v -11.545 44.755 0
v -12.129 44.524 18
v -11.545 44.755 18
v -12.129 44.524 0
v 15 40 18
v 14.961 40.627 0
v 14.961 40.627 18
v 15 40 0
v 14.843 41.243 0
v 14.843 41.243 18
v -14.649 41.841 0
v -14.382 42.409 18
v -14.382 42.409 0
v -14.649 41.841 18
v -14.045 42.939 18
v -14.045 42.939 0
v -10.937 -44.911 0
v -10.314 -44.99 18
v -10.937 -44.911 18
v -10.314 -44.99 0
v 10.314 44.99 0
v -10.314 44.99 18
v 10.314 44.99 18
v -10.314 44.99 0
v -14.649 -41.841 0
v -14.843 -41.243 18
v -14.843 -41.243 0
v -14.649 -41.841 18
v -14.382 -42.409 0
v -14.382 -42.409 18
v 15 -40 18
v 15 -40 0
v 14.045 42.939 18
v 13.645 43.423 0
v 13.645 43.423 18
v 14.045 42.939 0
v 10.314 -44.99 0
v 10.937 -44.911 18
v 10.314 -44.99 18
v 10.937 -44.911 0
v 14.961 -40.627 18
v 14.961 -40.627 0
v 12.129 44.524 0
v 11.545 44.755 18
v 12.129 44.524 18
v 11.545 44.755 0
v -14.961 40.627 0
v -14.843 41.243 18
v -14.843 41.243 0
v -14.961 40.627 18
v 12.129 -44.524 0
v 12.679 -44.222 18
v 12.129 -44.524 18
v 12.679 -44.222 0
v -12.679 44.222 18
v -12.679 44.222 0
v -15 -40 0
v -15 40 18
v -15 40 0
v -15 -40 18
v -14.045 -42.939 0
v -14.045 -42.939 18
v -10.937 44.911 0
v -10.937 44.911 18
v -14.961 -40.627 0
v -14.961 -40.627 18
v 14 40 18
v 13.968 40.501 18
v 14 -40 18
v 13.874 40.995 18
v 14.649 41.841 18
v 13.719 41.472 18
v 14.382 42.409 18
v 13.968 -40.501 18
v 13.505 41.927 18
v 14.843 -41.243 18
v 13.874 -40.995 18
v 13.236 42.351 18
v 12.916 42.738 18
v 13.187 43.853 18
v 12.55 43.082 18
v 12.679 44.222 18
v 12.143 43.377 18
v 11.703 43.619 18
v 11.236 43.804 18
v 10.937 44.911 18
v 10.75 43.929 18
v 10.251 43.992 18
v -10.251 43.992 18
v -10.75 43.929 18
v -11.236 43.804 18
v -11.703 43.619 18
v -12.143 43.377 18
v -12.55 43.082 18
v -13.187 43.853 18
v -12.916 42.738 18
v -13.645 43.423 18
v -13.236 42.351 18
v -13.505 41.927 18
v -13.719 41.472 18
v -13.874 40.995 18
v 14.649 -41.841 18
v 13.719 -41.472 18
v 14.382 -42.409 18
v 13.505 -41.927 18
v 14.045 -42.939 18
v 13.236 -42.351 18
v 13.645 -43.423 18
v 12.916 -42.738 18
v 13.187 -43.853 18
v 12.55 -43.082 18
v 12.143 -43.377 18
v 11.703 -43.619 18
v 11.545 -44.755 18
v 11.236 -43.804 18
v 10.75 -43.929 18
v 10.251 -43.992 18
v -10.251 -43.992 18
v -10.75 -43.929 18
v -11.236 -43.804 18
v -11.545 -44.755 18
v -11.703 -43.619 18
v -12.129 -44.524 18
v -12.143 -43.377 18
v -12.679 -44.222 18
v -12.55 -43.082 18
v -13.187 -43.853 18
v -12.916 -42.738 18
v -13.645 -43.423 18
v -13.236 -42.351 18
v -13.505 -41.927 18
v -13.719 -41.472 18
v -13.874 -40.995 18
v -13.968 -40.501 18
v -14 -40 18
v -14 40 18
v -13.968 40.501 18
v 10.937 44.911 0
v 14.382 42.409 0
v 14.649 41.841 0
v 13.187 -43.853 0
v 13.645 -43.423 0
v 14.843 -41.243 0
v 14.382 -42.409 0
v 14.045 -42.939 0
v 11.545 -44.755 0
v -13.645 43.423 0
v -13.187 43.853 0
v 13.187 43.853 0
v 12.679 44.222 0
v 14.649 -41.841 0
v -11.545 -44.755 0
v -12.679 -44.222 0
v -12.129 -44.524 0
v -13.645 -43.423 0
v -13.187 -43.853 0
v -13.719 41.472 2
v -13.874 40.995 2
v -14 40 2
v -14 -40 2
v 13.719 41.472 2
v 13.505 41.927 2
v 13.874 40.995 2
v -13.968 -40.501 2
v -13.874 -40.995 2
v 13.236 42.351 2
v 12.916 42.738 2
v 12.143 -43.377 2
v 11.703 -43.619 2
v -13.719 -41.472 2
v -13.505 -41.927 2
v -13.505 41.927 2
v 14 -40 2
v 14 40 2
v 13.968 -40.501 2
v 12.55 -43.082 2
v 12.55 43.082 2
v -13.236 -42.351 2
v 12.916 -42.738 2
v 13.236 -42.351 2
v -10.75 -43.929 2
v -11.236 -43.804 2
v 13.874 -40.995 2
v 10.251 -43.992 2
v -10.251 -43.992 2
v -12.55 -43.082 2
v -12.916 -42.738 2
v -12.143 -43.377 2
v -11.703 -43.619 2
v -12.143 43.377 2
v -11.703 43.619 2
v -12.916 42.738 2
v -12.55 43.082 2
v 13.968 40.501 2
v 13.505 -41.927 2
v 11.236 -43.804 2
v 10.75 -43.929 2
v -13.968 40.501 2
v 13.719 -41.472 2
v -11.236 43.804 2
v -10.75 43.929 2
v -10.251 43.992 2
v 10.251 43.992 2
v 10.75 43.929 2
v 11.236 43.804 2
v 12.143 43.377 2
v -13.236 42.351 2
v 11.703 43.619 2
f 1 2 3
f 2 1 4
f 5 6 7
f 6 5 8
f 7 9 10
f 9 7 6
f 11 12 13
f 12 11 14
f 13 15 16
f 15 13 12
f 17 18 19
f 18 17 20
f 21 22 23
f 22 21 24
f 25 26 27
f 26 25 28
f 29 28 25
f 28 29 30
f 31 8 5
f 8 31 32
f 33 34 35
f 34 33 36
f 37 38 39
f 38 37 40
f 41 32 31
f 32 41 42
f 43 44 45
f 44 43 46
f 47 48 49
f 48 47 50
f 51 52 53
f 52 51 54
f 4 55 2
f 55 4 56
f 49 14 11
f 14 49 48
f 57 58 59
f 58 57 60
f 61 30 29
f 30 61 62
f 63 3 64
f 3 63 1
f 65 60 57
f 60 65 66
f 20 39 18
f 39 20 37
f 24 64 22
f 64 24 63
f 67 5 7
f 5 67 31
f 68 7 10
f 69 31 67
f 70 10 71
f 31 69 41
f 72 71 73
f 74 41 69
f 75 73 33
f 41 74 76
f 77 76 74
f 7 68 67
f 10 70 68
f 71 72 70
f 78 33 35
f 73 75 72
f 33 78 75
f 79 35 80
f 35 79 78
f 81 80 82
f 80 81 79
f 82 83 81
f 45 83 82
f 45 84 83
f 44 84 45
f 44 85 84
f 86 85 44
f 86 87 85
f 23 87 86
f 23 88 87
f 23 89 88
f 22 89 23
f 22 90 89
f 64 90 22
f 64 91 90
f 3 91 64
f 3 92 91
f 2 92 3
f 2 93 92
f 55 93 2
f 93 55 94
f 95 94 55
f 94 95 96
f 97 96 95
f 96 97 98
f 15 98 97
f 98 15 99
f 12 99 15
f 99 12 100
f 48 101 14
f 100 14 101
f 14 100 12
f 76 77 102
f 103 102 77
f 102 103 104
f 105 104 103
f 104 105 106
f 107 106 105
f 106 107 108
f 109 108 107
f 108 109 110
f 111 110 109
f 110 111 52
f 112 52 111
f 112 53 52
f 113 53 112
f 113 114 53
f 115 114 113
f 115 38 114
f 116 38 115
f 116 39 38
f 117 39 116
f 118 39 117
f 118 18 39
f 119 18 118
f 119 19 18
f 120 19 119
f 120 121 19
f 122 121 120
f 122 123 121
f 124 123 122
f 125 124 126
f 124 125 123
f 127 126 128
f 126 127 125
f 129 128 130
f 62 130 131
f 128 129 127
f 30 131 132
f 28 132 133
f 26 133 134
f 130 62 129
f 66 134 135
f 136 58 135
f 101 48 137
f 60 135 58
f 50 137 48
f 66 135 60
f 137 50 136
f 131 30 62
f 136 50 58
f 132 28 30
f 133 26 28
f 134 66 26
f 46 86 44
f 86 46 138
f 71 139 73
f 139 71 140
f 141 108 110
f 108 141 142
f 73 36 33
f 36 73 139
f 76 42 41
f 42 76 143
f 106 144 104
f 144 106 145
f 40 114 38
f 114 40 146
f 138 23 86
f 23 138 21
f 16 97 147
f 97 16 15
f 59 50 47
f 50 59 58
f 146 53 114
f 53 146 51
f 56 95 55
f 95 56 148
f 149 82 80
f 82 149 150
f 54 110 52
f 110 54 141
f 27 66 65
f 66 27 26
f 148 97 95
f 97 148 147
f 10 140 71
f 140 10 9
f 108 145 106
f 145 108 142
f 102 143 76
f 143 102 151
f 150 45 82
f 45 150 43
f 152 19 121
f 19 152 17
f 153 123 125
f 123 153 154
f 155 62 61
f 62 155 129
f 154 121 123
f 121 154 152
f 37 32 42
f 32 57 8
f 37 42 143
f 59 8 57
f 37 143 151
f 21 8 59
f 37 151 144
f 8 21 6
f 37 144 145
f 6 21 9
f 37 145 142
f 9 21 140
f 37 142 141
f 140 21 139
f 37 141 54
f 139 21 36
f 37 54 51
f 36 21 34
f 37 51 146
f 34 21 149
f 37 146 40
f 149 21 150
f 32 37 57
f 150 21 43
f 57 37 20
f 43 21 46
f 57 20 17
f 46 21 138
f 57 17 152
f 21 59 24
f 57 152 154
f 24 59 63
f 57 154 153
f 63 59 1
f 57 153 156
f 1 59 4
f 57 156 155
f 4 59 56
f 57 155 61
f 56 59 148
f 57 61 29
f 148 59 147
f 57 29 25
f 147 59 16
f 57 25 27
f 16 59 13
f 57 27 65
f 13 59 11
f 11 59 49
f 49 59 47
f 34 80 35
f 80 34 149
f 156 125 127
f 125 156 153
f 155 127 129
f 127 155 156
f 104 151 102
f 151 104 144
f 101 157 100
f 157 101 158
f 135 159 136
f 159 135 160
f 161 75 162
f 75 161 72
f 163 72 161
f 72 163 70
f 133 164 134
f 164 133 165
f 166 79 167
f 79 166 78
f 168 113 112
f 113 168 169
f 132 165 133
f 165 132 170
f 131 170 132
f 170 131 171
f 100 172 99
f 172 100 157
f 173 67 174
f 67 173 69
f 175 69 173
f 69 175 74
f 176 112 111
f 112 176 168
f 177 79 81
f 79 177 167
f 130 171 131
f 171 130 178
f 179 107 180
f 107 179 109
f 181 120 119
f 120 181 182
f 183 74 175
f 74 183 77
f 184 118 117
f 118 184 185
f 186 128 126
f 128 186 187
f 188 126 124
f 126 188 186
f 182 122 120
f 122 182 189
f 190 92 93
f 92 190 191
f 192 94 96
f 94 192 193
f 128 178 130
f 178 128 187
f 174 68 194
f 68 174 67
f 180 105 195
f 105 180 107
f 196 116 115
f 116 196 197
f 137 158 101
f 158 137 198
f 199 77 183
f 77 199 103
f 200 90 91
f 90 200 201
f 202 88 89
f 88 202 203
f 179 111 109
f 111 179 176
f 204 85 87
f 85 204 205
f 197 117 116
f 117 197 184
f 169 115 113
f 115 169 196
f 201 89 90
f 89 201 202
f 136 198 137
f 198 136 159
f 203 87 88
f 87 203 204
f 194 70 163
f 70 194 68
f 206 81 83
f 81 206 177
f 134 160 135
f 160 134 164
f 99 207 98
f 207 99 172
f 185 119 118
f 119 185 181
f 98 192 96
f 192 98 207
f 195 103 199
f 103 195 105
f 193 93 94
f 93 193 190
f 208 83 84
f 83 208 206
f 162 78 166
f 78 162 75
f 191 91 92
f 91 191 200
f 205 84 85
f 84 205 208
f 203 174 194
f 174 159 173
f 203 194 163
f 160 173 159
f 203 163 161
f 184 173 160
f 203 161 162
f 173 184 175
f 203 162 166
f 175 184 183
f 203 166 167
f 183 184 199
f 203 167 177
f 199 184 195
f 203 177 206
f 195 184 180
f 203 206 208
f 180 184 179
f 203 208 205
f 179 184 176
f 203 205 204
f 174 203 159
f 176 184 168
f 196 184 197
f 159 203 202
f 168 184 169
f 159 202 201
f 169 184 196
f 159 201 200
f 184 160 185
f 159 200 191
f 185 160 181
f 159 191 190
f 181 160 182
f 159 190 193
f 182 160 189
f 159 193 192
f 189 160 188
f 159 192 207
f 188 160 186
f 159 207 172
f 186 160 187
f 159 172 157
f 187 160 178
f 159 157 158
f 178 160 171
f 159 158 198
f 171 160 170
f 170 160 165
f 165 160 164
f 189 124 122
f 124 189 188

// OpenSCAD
$fn = 50;


difference() {
	union() {
		hull() {
			translate(v = [-10.0000000000, 40.0000000000, 0]) {
				cylinder(h = 18, r = 5);
			}
			translate(v = [10.0000000000, 40.0000000000, 0]) {
				cylinder(h = 18, r = 5);
			}
			translate(v = [-10.0000000000, -40.0000000000, 0]) {
				cylinder(h = 18, r = 5);
			}
			translate(v = [10.0000000000, -40.0000000000, 0]) {
				cylinder(h = 18, r = 5);
			}
		}
	}
	union() {
		translate(v = [0, 0, 2]) {
			hull() {
				translate(v = [-10.0000000000, 40.0000000000, 0]) {
					cylinder(h = 16, r = 4);
				}
				translate(v = [10.0000000000, 40.0000000000, 0]) {
					cylinder(h = 16, r = 4);
				}
				translate(v = [-10.0000000000, -40.0000000000, 0]) {
					cylinder(h = 16, r = 4);
				}
				translate(v = [10.0000000000, -40.0000000000, 0]) {
					cylinder(h = 16, r = 4);
				}
			}
		}
	}
}
